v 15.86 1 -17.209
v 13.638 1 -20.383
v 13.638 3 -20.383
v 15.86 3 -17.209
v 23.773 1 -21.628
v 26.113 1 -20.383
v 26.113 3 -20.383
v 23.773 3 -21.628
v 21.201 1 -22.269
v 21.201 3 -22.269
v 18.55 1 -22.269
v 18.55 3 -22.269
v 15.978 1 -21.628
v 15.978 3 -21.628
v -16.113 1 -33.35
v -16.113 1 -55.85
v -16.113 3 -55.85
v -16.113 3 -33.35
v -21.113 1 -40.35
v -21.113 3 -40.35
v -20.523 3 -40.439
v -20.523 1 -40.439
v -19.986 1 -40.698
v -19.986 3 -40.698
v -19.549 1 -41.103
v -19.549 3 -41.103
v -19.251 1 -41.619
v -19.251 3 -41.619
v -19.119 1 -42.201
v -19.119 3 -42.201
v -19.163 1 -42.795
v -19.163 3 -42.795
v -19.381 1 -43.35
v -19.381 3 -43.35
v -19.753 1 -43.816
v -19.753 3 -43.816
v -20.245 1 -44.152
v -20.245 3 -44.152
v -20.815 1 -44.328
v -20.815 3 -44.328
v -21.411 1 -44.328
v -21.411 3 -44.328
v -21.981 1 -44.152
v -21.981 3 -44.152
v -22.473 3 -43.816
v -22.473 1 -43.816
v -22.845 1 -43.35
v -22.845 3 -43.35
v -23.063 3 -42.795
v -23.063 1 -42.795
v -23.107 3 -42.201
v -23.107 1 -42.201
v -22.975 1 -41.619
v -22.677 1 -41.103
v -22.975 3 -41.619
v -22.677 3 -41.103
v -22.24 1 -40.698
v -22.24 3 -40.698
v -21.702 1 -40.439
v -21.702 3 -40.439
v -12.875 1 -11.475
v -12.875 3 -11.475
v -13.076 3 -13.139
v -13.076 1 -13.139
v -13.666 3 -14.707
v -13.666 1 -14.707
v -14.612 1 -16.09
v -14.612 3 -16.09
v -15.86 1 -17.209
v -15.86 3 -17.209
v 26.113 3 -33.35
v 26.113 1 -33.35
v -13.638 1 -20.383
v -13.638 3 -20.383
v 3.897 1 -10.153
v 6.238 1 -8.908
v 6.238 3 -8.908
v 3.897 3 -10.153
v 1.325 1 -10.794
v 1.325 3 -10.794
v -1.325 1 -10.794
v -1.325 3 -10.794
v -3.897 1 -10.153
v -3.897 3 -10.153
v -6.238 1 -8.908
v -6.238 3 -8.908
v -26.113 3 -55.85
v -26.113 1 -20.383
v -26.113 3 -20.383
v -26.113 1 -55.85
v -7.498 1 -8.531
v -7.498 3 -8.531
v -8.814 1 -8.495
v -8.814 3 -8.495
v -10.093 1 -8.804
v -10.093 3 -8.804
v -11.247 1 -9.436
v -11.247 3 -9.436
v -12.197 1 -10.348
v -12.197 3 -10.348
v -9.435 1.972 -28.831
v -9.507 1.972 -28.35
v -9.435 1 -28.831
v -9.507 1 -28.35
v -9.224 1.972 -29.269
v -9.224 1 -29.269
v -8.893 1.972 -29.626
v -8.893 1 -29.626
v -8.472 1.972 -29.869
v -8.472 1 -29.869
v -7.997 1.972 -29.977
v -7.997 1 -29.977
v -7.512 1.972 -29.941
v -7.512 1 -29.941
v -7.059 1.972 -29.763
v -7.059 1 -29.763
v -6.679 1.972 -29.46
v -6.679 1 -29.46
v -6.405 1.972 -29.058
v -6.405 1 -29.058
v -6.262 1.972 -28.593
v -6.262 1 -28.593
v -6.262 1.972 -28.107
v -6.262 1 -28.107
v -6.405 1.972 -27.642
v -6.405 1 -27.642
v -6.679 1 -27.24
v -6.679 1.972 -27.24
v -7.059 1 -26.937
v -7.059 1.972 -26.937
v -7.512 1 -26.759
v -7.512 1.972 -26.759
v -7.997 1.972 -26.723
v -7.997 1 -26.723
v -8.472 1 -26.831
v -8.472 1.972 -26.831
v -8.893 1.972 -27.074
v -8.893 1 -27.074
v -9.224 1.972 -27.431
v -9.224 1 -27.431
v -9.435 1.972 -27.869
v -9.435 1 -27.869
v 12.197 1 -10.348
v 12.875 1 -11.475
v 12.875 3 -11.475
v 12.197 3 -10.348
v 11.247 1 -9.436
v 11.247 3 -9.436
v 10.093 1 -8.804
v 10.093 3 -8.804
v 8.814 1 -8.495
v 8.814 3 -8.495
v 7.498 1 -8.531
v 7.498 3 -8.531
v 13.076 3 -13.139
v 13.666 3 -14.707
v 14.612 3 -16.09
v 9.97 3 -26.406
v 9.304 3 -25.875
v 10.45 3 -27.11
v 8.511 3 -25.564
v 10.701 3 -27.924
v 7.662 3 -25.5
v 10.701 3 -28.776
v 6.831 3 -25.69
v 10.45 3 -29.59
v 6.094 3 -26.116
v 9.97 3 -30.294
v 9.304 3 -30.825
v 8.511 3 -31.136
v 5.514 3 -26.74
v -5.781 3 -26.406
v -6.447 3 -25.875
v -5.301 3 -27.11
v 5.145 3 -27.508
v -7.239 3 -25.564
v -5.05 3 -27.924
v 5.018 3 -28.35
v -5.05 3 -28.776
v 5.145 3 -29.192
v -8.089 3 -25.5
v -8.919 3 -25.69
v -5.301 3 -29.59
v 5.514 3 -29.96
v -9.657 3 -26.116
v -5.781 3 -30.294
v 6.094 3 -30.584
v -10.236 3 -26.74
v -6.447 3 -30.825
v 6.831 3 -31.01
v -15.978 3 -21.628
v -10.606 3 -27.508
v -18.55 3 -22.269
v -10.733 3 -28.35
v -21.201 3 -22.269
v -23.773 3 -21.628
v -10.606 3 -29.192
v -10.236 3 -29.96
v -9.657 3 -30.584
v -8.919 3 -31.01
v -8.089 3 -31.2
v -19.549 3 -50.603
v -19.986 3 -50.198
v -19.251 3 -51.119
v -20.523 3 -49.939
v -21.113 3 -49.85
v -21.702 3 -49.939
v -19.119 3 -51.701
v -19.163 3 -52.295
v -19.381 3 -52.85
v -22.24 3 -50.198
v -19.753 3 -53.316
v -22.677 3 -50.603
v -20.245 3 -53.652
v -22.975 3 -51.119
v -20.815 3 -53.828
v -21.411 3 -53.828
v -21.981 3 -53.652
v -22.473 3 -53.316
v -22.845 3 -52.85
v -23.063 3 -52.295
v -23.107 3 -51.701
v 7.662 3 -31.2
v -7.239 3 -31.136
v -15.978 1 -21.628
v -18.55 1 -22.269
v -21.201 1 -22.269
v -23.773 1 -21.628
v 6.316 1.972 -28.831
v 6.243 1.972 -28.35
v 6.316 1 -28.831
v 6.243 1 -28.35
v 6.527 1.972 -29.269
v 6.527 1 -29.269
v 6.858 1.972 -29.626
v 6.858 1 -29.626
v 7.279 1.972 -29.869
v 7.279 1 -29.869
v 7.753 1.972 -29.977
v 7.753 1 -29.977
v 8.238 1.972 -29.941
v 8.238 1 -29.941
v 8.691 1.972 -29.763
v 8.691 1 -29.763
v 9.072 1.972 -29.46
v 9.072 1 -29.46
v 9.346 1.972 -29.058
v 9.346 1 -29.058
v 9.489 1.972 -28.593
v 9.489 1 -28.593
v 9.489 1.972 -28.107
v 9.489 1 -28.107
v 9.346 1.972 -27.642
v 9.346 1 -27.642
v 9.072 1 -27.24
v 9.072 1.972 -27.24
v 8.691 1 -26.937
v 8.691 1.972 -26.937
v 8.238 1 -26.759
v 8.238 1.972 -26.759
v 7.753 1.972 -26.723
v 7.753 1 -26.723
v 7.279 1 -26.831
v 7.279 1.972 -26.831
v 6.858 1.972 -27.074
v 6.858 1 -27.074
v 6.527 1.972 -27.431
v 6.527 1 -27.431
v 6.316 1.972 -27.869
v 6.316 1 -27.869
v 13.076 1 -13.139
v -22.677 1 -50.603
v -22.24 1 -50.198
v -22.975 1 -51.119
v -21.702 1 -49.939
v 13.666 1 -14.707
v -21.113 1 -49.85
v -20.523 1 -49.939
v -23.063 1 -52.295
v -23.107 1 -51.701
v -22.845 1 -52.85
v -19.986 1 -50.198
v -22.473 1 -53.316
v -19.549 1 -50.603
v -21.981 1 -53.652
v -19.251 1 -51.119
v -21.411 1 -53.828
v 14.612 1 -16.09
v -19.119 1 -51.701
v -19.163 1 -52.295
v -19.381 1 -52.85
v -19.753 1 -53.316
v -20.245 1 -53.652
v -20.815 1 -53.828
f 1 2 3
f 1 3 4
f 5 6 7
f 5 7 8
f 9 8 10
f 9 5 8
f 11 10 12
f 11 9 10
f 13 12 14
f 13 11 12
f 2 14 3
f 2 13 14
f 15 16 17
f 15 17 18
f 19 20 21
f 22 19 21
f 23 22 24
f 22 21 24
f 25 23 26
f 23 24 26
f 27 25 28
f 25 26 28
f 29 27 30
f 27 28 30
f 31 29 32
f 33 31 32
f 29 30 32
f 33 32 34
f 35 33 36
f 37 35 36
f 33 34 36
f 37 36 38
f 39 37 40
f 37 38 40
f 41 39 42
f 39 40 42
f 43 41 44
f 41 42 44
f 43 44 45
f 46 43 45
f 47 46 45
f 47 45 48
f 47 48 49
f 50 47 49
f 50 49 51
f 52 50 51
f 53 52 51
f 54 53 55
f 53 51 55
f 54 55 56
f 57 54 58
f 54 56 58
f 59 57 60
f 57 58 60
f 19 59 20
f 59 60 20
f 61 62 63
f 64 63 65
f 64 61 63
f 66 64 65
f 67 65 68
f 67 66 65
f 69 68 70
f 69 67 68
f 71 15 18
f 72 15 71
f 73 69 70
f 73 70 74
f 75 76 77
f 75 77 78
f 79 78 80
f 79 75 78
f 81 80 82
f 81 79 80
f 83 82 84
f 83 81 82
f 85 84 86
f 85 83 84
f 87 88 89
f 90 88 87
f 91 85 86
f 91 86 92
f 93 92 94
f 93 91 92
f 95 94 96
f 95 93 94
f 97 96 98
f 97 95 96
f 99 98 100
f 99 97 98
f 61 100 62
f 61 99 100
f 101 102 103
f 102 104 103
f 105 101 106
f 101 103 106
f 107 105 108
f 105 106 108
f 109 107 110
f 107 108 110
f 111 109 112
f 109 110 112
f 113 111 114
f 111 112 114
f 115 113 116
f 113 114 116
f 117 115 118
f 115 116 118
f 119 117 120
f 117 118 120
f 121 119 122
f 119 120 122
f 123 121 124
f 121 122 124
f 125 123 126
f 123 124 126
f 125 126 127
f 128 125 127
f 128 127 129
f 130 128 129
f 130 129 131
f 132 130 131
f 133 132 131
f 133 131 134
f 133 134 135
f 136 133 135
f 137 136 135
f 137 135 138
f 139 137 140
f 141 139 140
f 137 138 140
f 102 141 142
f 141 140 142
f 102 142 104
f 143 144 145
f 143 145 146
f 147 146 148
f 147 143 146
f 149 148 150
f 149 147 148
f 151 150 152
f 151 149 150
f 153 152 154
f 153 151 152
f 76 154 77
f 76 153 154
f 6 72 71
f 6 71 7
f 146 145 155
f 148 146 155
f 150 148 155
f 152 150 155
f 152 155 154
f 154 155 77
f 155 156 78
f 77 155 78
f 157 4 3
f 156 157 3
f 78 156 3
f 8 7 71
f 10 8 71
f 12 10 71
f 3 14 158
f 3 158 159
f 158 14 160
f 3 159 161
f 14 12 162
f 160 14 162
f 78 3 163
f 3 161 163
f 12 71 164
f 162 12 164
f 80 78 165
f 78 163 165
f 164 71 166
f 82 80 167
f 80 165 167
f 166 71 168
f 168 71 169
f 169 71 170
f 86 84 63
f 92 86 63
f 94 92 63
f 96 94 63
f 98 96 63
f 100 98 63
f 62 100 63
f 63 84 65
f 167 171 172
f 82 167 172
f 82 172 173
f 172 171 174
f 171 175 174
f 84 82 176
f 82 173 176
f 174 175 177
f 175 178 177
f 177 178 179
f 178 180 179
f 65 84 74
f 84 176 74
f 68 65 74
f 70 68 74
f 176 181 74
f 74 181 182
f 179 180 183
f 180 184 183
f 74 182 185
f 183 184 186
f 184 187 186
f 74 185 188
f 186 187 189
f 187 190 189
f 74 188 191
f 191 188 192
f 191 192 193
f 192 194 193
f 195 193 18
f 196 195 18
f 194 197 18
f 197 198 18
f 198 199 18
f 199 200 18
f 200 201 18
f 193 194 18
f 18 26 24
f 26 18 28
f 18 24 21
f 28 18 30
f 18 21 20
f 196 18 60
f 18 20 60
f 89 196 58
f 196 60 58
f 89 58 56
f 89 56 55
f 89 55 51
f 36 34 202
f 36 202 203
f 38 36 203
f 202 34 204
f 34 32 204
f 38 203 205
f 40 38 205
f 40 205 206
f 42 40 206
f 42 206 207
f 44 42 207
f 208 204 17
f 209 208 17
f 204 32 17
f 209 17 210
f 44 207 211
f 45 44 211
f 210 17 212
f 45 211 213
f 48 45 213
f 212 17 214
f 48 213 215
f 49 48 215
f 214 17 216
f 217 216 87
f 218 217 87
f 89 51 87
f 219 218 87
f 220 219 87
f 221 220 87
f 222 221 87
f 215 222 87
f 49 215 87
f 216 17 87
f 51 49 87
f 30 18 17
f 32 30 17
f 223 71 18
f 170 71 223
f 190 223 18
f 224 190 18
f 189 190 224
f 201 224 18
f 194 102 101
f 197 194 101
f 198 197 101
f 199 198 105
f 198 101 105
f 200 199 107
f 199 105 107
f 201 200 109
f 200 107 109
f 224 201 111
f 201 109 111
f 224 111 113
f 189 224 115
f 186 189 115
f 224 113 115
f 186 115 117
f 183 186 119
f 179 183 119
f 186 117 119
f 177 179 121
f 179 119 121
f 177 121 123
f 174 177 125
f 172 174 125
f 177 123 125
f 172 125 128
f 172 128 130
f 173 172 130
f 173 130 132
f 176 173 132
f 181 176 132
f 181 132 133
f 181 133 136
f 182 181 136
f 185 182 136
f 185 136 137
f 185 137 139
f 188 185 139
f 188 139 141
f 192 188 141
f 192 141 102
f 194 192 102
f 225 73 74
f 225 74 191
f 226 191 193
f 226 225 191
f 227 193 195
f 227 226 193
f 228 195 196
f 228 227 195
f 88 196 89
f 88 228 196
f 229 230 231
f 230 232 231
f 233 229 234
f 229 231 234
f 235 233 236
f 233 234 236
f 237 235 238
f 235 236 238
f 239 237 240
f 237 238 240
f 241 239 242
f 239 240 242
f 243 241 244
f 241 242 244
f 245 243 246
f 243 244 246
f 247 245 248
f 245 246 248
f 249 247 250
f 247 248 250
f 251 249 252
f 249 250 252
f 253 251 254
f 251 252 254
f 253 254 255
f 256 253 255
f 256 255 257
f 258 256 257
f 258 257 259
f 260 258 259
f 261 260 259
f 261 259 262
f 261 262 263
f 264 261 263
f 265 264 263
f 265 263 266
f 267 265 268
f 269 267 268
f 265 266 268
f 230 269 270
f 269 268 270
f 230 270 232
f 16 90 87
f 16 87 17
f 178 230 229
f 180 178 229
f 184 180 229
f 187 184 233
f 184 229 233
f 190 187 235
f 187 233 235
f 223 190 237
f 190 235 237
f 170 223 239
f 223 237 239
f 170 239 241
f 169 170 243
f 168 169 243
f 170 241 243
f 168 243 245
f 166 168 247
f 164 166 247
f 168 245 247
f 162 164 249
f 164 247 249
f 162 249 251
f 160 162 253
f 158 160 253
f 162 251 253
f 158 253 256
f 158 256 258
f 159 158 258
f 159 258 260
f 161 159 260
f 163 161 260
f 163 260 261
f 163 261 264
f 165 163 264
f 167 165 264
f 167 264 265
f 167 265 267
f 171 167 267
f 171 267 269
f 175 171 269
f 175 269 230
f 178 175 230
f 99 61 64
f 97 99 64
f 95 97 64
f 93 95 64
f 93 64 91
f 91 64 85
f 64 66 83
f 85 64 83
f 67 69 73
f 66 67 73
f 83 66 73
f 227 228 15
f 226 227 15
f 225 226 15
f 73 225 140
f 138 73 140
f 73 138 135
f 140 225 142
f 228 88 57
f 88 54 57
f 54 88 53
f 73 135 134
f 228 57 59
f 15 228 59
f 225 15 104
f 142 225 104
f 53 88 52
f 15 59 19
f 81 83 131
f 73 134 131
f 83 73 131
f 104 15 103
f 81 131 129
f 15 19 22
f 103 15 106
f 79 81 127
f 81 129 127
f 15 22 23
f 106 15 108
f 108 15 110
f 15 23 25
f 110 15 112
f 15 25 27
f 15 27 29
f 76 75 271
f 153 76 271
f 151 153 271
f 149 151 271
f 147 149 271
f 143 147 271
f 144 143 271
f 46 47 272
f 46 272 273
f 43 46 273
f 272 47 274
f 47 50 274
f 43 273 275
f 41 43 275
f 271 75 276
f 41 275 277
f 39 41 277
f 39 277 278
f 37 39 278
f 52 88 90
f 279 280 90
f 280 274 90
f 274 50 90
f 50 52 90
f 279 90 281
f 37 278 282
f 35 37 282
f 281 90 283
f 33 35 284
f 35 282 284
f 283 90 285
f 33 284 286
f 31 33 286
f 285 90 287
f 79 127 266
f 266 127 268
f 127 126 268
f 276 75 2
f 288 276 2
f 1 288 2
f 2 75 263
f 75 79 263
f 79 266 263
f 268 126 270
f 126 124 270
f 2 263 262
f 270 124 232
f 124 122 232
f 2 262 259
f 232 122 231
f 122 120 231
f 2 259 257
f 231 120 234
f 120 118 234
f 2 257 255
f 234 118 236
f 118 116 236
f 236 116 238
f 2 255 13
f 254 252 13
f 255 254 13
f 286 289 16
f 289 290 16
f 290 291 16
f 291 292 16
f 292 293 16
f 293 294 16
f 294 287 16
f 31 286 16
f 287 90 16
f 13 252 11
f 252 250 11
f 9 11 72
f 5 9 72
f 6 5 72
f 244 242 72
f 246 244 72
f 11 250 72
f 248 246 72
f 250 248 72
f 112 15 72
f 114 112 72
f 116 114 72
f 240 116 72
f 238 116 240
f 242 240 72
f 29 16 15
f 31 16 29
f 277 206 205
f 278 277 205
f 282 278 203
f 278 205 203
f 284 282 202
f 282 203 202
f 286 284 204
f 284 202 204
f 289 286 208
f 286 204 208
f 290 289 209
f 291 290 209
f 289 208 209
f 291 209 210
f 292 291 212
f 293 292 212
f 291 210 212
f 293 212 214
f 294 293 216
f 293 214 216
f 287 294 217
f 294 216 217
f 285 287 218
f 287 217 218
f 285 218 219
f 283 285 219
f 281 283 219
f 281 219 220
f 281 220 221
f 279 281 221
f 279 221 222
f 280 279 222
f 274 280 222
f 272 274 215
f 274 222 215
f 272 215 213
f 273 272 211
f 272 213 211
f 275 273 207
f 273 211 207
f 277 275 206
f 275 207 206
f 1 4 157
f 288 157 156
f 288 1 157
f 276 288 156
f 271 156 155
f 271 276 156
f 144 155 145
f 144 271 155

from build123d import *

# Parameters (mm, degrees)
BOSS_EXTRUDE1_DEPTH                               = 3
CONVERT_SOLID1_DEPTH                              = 1
SKETCH8_R                                         = 2
CUT_EXTRUDE1_DEPTH                                = 2
CSK_FOR_4_FLAT_HEAD_MACHINE_SCREW_100_D           = 3.2639
CSK_FOR_4_FLAT_HEAD_MACHINE_SCREW_100_DEPTH       = 2
CSK_FOR_4_FLAT_HEAD_MACHINE_SCREW_100_CSINK_D     = 5.715
CSK_FOR_4_FLAT_HEAD_MACHINE_SCREW_100_CSINK_ANGLE = 100
CSK_FOR_4_FLAT_HEAD_MACHINE_SCREW_100_TIP         = 0.980574487


# Read off the part's stored shape, not the designer's step: Convert-Solid1
with BuildPart() as part:
    # Sketch2 → Boss-Extrude1 (new body)
    with BuildSketch(Plane(origin=(0, 0, 0), x_dir=(1, 0, 0), z_dir=(0, 1, 0))):
        with BuildLine():
            Line((-15.860247962, 17.20906431), (-13.637639272, 20.383278482))
            ThreePointArc((-13.637639272, 20.383278482), (-19.875283017, 22.35), (-26.112926762, 20.383278482))
            Line((-26.112926762, 20.383278482), (-26.112926762, 33.35))
            Line((-26.112926762, 33.35), (-26.112926762, 55.85))
            Line((-26.112926762, 55.85), (-16.112926762, 55.85))
            Line((-16.112926762, 55.85), (-16.112926762, 33.35))
            Line((-16.112926762, 33.35), (26.112926762, 33.35))
            Line((26.112926762, 33.35), (26.112926762, 20.383278482))
            ThreePointArc((26.112926762, 20.383278482), (19.875283017, 22.35), (13.637639272, 20.383278482))
            Line((13.637639272, 20.383278482), (15.860247962, 17.20906431))
            ThreePointArc((15.860247962, 17.20906431), (13.666207185, 14.707240293), (12.875283017, 11.475))
            ThreePointArc((12.875283017, 11.475), (10.092914311, 8.804356775), (6.237643745, 8.908278482))
            ThreePointArc((6.237643745, 8.908278482), (0, 10.875), (-6.237643745, 8.908278482))
            ThreePointArc((-6.237643745, 8.908278482), (-10.092914311, 8.804356775), (-12.875283017, 11.475))
            ThreePointArc((-12.875283017, 11.475), (-13.666207185, 14.707240293), (-15.860247962, 17.20906431))
        make_face()
    extrude(amount=BOSS_EXTRUDE1_DEPTH)

    # Convert-Solid1 outline → Convert-Solid1 (cut)
    with BuildSketch(Plane(origin=(0, 0, 0), x_dir=(1, 0, 0), z_dir=(0, 1, 0))):
        with BuildLine():
            Line((-26.112926762, 55.85), (-26.112926762, 20.383278482))
            ThreePointArc((-26.112926762, 20.383278482), (-19.875283017, 22.35), (-13.637639272, 20.383278482))
            Line((-13.637639272, 20.383278482), (-15.860247962, 17.20906431))
            ThreePointArc((-15.860247962, 17.20906431), (-13.666207185, 14.707240292), (-12.875283017, 11.475))
            ThreePointArc((-12.875283017, 11.475), (-10.092914311, 8.804356775), (-6.237643745, 8.908278482))
            ThreePointArc((-6.237643745, 8.908278482), (0, 10.875), (6.237643745, 8.908278482))
            ThreePointArc((6.237643745, 8.908278482), (10.092914311, 8.804356775), (12.875283017, 11.475))
            ThreePointArc((12.875283017, 11.475), (13.666207185, 14.707240292), (15.860247962, 17.20906431))
            Line((15.860247962, 17.20906431), (13.637639272, 20.383278482))
            ThreePointArc((13.637639272, 20.383278482), (19.875283017, 22.35), (26.112926762, 20.383278482))
            Line((26.112926762, 20.383278482), (26.112926762, 33.35))
            Line((26.112926762, 33.35), (-16.112926762, 33.35))
            Line((-16.112926762, 33.35), (-16.112926762, 55.85))
            Line((-16.112926762, 55.85), (-26.112926762, 55.85))
        make_face()
    extrude(amount=CONVERT_SOLID1_DEPTH, mode=Mode.SUBTRACT)

    # Sketch8 → Cut-Extrude1 (cut)
    with BuildSketch(Plane(origin=(0, 3, 0), x_dir=(1, 0, 0), z_dir=(0, 1, 0))):
        with Locations(Location((-21.112926762, 51.85, 0), (0, 0, 270))):
            Circle(SKETCH8_R)
        with Locations(Location((-21.112926762, 42.35, 0), (0, 0, 270))):
            Circle(SKETCH8_R)
    extrude(amount=-CUT_EXTRUDE1_DEPTH, mode=Mode.SUBTRACT)

    # CSK for #4 Flat Head Machine Screw (100)1
    with Locations(Plane(origin=(0, 3, 0), x_dir=(1, 0, 0), z_dir=(0, 1, 0))):
        with Locations((7.875283017, 28.35), (-7.875283017, 28.35)):
            CounterSinkHole(CSK_FOR_4_FLAT_HEAD_MACHINE_SCREW_100_D / 2, CSK_FOR_4_FLAT_HEAD_MACHINE_SCREW_100_CSINK_D / 2, depth=CSK_FOR_4_FLAT_HEAD_MACHINE_SCREW_100_DEPTH, counter_sink_angle=CSK_FOR_4_FLAT_HEAD_MACHINE_SCREW_100_CSINK_ANGLE)
            with Locations((0, 0, -(CSK_FOR_4_FLAT_HEAD_MACHINE_SCREW_100_DEPTH + CSK_FOR_4_FLAT_HEAD_MACHINE_SCREW_100_TIP / 2))):  # 118° drill point
                Cone(0, CSK_FOR_4_FLAT_HEAD_MACHINE_SCREW_100_D / 2, CSK_FOR_4_FLAT_HEAD_MACHINE_SCREW_100_TIP, mode=Mode.SUBTRACT)


solid = part.part
